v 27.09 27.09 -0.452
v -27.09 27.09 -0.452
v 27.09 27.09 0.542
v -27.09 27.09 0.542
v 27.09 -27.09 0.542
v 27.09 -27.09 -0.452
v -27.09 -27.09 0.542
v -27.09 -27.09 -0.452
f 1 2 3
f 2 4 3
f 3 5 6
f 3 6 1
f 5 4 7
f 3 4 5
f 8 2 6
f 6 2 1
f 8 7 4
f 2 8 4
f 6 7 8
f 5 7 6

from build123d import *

# Parameters (mm, degrees)
F0_W     = 6
F0_H     = 6
F1_DEPTH = 0.06
F2_SCALE = 10
F5_START = -2
F4_W     = 60
F4_H     = 60
F5_DEPTH = 0.5
F6_SCALE = 0.903


# Not quite as in the source:
# - a feature names something its author has since deleted; it is built from what else it names


with BuildPart() as f1:
    # F0 (on Top) → F1 (new body)
    with BuildSketch(Plane.XY):
        Rectangle(F0_W, F0_H)
    extrude(amount=F1_DEPTH)


with BuildPart() as f1_1:
    # F2: moved
    add(f1.part.scale(F2_SCALE))

    # F4 (on offset) → F5 (join)
    with BuildSketch(Plane.XY.offset(2).offset(F5_START)):
        Rectangle(F4_W, F4_H)
    extrude(amount=-F5_DEPTH)


with BuildPart() as f1_2:
    # F6: moved
    add(f1_1.part.scale(F6_SCALE))


solid = f1_2.part
